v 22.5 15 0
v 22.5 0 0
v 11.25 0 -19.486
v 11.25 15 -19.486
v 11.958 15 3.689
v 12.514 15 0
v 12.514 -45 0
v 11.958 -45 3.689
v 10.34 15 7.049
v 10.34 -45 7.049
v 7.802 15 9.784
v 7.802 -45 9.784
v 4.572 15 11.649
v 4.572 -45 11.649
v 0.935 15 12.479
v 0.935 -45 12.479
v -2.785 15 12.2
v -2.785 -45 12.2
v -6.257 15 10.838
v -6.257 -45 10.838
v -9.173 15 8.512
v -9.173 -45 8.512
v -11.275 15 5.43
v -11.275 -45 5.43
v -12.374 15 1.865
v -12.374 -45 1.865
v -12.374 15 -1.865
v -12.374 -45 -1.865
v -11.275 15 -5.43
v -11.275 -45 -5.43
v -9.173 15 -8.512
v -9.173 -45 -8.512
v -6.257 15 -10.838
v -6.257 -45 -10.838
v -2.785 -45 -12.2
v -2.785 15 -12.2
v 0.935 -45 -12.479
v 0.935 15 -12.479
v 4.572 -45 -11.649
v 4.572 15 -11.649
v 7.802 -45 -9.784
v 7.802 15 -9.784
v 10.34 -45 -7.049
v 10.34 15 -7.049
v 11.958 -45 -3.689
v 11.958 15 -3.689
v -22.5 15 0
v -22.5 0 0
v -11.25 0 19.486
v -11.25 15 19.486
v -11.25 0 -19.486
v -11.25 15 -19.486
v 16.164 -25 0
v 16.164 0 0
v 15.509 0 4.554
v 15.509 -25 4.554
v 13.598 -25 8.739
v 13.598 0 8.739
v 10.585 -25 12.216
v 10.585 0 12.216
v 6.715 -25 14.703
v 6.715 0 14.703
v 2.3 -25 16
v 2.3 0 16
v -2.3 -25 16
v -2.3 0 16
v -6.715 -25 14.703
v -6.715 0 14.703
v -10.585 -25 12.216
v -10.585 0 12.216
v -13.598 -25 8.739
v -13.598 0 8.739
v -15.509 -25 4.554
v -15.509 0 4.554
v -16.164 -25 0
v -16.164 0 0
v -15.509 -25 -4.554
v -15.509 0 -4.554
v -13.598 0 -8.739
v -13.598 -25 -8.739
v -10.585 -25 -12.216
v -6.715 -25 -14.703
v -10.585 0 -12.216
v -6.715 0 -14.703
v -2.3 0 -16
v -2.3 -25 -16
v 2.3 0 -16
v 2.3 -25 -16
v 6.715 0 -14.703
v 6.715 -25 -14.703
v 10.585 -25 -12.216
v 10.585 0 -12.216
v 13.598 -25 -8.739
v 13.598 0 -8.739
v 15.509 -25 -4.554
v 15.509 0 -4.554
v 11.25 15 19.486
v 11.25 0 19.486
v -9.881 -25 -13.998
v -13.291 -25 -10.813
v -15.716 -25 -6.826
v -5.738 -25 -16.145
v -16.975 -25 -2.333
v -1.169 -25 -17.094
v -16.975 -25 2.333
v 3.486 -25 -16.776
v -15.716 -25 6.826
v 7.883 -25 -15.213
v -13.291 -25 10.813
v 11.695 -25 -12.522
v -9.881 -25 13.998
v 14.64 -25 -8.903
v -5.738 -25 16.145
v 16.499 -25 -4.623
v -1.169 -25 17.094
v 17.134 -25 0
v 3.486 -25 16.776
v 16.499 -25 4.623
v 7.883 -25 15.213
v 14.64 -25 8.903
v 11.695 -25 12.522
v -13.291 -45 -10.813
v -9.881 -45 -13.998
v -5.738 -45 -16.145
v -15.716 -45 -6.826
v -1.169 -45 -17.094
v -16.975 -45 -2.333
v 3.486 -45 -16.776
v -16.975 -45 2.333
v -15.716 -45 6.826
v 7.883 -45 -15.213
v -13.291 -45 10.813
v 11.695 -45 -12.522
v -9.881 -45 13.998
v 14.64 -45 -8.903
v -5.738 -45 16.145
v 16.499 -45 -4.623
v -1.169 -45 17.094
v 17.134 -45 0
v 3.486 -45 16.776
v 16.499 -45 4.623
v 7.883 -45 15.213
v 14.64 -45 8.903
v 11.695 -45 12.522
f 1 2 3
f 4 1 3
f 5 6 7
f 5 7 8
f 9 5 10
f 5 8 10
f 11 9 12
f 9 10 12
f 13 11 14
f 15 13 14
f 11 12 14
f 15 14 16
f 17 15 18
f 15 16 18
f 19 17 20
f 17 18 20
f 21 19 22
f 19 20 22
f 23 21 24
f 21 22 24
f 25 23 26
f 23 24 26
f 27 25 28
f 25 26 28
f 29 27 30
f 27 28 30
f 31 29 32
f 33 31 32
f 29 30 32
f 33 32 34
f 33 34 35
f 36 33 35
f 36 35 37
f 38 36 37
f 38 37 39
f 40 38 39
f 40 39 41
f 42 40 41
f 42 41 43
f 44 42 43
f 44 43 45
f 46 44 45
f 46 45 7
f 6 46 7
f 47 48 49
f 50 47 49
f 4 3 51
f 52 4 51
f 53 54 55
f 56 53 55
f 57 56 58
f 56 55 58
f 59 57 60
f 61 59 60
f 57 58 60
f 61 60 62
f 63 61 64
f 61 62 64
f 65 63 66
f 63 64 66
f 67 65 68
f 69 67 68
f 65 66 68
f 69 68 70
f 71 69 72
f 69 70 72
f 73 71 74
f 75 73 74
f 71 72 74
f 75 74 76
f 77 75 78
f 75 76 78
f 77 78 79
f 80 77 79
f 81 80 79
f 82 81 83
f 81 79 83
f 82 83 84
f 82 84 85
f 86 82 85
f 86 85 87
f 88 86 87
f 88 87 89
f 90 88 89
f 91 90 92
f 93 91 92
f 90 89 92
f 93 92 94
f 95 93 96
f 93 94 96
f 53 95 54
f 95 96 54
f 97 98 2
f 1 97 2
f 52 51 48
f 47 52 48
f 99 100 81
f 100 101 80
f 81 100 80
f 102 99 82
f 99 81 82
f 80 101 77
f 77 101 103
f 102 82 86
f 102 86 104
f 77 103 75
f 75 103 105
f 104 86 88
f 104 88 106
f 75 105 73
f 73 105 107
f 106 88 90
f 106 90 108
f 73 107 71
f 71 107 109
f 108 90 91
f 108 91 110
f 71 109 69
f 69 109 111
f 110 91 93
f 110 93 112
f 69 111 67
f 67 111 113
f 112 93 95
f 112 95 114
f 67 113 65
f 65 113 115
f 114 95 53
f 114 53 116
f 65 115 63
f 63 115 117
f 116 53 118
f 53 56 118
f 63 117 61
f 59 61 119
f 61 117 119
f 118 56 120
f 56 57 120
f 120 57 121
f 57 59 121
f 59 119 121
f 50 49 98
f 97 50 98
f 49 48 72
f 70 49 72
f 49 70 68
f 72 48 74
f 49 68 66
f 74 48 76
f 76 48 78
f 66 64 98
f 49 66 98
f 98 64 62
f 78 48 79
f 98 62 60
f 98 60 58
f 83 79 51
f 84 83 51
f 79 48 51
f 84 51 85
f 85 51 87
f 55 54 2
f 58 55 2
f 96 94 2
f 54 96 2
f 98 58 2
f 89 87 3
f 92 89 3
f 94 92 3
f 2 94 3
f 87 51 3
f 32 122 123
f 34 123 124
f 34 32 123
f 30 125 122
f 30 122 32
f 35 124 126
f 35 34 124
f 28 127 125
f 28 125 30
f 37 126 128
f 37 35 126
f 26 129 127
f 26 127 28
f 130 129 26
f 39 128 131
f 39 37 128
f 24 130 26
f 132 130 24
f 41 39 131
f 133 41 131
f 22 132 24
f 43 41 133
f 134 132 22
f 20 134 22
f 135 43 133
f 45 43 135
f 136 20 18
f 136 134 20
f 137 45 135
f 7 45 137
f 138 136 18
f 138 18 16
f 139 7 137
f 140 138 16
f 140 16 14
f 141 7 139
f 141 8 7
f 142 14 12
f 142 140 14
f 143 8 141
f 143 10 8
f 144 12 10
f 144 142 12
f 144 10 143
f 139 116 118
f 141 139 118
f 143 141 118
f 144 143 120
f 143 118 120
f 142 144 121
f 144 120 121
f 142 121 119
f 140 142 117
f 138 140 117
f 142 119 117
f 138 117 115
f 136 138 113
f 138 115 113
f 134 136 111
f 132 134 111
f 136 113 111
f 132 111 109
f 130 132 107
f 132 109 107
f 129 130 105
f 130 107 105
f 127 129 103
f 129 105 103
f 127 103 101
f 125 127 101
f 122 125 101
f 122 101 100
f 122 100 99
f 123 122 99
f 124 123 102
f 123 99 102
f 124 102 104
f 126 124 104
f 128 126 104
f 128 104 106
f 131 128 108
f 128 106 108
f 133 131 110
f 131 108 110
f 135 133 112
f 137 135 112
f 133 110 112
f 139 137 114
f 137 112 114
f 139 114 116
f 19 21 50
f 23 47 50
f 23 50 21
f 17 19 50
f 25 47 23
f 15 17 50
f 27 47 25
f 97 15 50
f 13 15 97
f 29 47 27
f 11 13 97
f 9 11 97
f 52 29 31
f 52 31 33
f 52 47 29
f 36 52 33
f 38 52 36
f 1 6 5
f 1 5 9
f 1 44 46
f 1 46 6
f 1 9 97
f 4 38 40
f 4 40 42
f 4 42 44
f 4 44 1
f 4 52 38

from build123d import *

# Parameters (mm, degrees)
SALIENTE_EXTRUIR1_DEPTH = 15
CROQUIS2_R              = 16.164040976
SALIENTE_EXTRUIR2_DEPTH = 25
CROQUIS3_R              = 17.134212929
SALIENTE_EXTRUIR3_DEPTH = 20
CROQUIS4_R              = 12.514075771
CORTAR_EXTRUIR1_DEPTH   = 61


with BuildPart() as part:
    # Croquis1 → Saliente-Extruir1 (new body)
    with BuildSketch(Plane(origin=(0, 0, 0), x_dir=(1, 0, 0), z_dir=(0, 1, 0))):
        Polygon((22.5, 0), (11.25, 19.485571585), (-11.25, 19.485571585), (-22.5, 0), (-11.25, -19.485571585), (11.25, -19.485571585), align=None)
    extrude(amount=SALIENTE_EXTRUIR1_DEPTH)

    # Croquis2 → Saliente-Extruir2 (add)
    with BuildSketch(Plane.XZ):
        Circle(CROQUIS2_R)
    extrude(amount=SALIENTE_EXTRUIR2_DEPTH)

    # Croquis3 → Saliente-Extruir3 (add)
    with BuildSketch(Plane.XZ.offset(25)):
        Circle(CROQUIS3_R)
    extrude(amount=SALIENTE_EXTRUIR3_DEPTH)

    # Croquis4 → Cortar-Extruir1 (cut, through all)
    with BuildSketch(Plane.XZ.offset(45)):
        Circle(CROQUIS4_R)
    extrude(amount=-CORTAR_EXTRUIR1_DEPTH, mode=Mode.SUBTRACT)


solid = part.part
